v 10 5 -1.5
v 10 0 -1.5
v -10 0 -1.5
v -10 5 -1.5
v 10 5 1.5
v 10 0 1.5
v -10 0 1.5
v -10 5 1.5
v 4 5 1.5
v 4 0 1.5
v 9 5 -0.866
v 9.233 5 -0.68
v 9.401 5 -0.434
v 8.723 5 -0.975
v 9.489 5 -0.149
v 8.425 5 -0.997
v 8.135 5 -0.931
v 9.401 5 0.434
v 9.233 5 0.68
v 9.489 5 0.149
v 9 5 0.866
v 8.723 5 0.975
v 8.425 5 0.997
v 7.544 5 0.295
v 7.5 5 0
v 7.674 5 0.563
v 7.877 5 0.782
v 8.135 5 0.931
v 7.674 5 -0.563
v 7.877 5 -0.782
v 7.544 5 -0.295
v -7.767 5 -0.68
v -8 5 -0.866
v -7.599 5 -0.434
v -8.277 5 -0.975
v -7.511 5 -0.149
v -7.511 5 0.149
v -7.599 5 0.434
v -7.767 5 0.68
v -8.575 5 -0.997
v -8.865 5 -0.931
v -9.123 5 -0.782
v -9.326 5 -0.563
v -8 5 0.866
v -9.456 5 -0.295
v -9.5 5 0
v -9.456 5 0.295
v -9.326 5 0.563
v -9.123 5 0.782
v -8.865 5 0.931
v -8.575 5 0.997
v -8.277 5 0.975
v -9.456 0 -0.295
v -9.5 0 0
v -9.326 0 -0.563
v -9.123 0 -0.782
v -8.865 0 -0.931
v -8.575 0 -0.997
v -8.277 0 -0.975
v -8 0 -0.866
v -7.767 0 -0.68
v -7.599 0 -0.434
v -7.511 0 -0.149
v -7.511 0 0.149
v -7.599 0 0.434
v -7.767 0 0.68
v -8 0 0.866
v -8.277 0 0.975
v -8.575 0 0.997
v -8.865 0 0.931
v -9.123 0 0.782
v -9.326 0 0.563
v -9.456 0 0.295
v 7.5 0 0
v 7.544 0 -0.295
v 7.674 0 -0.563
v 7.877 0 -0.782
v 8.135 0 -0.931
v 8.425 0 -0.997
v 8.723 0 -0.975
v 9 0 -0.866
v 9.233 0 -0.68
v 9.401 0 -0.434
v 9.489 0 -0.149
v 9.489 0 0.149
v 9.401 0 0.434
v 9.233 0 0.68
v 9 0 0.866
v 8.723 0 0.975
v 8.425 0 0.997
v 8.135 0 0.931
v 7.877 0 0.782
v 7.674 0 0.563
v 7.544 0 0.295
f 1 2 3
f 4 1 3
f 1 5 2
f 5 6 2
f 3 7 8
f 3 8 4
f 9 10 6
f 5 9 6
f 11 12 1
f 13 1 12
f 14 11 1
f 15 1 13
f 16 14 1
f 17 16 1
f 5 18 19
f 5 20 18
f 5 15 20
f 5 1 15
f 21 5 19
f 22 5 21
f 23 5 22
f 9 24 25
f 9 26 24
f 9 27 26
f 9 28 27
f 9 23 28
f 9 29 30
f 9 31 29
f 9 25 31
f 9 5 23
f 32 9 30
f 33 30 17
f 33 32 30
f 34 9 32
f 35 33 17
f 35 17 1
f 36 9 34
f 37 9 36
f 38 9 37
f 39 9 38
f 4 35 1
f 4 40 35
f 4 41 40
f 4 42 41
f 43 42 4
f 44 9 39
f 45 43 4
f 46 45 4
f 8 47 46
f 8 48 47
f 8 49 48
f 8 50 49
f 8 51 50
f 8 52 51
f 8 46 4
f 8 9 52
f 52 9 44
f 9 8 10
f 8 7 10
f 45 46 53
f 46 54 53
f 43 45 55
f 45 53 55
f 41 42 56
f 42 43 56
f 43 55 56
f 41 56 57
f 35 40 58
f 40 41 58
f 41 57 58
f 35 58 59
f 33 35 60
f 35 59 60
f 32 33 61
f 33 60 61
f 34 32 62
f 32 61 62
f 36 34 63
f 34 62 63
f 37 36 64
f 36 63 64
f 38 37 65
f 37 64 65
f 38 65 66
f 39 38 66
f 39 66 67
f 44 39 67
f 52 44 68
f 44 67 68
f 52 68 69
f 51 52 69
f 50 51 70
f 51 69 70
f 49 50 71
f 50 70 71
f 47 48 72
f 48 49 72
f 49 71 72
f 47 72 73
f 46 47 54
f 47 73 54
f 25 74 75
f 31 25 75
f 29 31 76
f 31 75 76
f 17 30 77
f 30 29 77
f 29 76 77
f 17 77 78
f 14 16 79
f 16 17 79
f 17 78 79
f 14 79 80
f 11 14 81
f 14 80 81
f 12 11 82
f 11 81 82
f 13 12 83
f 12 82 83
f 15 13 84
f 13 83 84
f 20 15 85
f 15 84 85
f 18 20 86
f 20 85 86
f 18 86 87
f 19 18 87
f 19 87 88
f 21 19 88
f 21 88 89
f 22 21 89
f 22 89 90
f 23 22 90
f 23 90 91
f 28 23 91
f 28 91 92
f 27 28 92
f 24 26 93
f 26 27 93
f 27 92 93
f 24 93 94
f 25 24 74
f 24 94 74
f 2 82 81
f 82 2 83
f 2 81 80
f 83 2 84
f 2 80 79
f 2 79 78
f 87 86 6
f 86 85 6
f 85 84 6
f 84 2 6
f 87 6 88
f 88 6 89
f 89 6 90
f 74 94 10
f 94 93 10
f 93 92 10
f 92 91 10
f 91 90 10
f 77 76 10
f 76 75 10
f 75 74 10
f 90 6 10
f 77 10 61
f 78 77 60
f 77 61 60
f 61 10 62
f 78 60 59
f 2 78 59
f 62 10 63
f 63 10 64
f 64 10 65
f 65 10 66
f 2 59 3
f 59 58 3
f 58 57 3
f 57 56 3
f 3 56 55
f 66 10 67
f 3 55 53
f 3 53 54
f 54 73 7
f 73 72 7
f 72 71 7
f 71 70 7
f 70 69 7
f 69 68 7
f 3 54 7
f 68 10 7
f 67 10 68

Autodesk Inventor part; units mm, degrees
ref_plane "YZ Plane" through (0, 0, 0) normal (1, 0, 0) x (0, 1, 0)
ref_plane "XZ Plane" through (0, 0, 0) normal (0, 1, 0) x (-1, 0, 0)
ref_plane "XY Plane" through (0, 0, 0) normal (0, 0, 1) x (1, 0, 0)
sketch "Sketch1" plane through (0, 0, 0) normal (0, 1, 0) x (-1, 0, 0)
  line L0 (-10, -1.5) -> (10, -1.5)
  line L1 (10, 3.5) -> (10, 3.5)
  line L2 (10, 1.5) -> (-10, 1.5)
  line L3 (-10, 3.5) -> (-10, 3.5)
  line L4 (-10, -1.5) -> (10, 1.5) construction
  line L5 (10, -1.5) -> (-10, 1.5) construction
  circle A0 centre (8.5, 0) radius 1
  line L6 (-10, 1.5) -> (-10, -1.5)
  line L7 (10, 1.5) -> (10, -1.5)
  line L8 (-10, 1.5) -> (-4, 1.5)
  circle A1 centre (-8.5, 0) radius 1
  point P0 (0, 0)
  dimension "d0" = 3
  dimension "d1" = 20
  dimension "d3" = 2
  dimension "d6" = 1.5
  dimension "d8" = 1.5
  dimension "d21" = 2
  dimension "d22" = 1.5
  dimension "d23" = 1.5
extrude "Extrusion1" add sketch "Sketch1" along normal blind 5
properties part number "link"
